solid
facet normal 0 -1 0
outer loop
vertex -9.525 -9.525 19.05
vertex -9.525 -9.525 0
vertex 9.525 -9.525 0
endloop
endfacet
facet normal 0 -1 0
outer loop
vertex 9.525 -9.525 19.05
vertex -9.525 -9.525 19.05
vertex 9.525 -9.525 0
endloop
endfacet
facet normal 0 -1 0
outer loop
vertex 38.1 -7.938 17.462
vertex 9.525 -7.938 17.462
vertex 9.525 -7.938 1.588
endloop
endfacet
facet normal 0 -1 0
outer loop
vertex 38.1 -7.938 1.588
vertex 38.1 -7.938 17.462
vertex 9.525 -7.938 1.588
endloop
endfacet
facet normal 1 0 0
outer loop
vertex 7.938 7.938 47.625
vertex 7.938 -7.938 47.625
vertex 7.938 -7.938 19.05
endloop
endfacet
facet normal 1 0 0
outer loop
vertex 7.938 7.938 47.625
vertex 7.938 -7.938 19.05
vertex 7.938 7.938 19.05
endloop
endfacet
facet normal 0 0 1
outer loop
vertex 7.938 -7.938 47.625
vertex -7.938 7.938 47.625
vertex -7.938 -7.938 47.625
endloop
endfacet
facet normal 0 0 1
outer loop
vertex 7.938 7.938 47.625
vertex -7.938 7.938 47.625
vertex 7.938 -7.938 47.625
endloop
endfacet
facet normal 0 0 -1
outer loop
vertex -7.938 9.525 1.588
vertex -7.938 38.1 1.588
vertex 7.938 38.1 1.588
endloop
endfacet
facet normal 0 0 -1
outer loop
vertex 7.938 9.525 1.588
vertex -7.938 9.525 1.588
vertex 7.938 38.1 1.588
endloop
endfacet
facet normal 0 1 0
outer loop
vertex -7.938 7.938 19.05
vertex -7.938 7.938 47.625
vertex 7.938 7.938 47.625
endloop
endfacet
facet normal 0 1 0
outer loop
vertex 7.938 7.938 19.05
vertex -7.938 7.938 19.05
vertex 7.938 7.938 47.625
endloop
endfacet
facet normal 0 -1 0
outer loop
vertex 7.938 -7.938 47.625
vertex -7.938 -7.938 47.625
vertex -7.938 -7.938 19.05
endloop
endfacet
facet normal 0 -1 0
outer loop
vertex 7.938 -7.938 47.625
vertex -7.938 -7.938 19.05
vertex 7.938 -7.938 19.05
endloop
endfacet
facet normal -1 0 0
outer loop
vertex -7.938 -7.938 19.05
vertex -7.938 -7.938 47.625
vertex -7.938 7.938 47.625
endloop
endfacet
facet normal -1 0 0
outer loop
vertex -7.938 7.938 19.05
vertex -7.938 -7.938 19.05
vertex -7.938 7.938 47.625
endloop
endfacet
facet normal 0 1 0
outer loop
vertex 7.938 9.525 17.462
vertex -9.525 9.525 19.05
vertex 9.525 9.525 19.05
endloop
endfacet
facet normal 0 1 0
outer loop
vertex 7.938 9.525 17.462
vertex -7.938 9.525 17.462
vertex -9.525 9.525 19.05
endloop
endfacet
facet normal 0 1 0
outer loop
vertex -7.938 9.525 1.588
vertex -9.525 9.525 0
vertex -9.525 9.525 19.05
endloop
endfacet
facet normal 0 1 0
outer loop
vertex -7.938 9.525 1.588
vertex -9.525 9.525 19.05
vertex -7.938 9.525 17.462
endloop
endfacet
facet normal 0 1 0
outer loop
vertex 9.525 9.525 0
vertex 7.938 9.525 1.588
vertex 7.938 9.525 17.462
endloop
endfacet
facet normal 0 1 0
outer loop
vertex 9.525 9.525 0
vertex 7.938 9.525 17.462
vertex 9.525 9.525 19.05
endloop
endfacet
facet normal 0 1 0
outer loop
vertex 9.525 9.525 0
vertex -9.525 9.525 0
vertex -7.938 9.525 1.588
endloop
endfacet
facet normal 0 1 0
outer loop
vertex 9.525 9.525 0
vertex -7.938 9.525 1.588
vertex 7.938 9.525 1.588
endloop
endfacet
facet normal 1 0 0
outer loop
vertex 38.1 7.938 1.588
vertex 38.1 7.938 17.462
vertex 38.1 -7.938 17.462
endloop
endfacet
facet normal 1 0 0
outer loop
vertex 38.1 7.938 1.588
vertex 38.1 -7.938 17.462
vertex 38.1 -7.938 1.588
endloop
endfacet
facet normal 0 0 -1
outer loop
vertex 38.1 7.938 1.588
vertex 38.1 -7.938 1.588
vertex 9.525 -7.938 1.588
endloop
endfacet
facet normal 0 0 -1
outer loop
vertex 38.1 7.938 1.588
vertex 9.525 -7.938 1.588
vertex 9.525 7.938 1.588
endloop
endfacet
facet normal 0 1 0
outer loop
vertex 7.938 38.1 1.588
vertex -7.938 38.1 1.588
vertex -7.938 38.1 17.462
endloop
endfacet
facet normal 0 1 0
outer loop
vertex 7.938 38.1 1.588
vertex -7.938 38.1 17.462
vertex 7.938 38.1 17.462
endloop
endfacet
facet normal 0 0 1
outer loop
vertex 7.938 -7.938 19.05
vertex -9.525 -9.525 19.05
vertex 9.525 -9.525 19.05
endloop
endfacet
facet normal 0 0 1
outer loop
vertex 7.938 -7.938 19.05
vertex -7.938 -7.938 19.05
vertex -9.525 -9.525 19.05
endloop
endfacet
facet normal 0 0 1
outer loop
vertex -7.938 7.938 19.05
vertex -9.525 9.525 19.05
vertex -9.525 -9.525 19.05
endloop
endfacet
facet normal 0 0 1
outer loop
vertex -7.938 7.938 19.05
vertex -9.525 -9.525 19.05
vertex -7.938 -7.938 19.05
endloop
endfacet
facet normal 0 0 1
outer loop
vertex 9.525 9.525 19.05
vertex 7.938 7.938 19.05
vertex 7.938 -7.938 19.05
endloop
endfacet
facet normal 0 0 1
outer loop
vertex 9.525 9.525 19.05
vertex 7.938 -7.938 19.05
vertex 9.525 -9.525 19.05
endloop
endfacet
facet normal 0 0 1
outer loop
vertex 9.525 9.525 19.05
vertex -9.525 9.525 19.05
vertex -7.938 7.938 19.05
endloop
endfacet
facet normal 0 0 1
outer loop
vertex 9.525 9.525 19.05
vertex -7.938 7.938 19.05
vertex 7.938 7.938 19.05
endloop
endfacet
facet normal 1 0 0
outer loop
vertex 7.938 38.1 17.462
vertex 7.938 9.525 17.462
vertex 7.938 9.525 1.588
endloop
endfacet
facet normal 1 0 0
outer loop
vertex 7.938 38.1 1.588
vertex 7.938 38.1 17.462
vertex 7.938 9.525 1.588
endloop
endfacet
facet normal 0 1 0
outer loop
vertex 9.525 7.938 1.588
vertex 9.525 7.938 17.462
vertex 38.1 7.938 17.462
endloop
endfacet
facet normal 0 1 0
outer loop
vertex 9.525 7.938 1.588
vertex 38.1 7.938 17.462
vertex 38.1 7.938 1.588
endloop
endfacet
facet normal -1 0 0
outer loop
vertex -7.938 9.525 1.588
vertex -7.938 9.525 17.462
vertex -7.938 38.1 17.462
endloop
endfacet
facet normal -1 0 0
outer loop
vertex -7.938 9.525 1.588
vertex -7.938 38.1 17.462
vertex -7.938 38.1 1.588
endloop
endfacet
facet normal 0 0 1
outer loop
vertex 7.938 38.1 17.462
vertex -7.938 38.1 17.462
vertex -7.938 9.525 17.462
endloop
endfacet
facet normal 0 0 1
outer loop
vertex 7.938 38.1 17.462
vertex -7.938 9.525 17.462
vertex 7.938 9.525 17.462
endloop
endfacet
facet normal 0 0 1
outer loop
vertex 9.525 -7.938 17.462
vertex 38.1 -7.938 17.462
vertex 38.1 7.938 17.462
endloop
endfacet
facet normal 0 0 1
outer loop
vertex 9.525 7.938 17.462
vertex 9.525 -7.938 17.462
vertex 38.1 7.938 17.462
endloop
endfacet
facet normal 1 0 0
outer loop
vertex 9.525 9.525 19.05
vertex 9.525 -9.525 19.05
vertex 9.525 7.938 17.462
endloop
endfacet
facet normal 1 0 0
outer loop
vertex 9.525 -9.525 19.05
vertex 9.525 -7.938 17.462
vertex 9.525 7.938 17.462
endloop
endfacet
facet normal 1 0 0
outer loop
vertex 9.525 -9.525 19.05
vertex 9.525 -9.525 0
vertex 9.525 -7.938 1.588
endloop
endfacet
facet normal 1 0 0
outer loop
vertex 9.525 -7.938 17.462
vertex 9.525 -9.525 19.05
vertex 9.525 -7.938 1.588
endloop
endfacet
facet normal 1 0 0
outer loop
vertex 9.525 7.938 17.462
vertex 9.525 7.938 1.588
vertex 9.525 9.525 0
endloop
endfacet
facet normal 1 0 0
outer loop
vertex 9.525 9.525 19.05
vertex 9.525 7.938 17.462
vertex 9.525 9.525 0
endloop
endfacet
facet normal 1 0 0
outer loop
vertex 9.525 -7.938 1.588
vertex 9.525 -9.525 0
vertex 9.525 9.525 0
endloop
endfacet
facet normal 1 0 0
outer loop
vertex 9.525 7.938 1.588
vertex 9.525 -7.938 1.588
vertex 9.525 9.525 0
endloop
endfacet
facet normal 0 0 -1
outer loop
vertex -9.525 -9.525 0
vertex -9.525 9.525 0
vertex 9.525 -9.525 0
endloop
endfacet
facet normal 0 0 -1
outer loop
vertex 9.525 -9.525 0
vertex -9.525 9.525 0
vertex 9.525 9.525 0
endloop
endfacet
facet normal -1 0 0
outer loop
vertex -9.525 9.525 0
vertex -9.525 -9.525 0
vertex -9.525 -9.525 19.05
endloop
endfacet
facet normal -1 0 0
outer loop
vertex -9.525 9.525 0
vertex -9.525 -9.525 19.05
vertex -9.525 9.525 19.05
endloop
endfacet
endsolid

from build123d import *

# Parameters (mm, degrees)
SKETCH1_W           = 19.05
SKETCH1_H           = 19.05
BOSS_EXTRUDE1_DEPTH = 19.05
SKETCH2_W           = 15.875
SKETCH2_H           = 15.875
BOSS_EXTRUDE2_DEPTH = 28.575
SKETCH3_W           = 15.875
SKETCH3_H           = 15.875
BOSS_EXTRUDE3_DEPTH = 28.575
SKETCH4_W           = 15.875
SKETCH4_H           = 15.875
BOSS_EXTRUDE4_DEPTH = 28.575


with BuildPart() as part:
    # Sketch1 → Boss-Extrude1 (new body)
    with BuildSketch(Plane.XY):
        Rectangle(SKETCH1_W, SKETCH1_H)
    extrude(amount=BOSS_EXTRUDE1_DEPTH)

    # Sketch2 → Boss-Extrude2 (add)
    with BuildSketch(Plane(origin=(0, 9.525, 0), x_dir=(1, 0, 0), z_dir=(0, 1, 0))):
        with Locations((0, -9.525)):
            Rectangle(SKETCH2_W, SKETCH2_H)
    extrude(amount=BOSS_EXTRUDE2_DEPTH)

    # Sketch3 → Boss-Extrude3 (add)
    with BuildSketch(Plane(origin=(9.525, 0, 0), x_dir=(0, 0, -1), z_dir=(1, 0, 0))):
        with Locations((-9.525, 0)):
            Rectangle(SKETCH3_W, SKETCH3_H)
    extrude(amount=BOSS_EXTRUDE3_DEPTH)

    # Sketch4 → Boss-Extrude4 (add)
    with BuildSketch(Plane.XY.offset(19.05)):
        Rectangle(SKETCH4_W, SKETCH4_H)
    extrude(amount=BOSS_EXTRUDE4_DEPTH)


solid = part.part
